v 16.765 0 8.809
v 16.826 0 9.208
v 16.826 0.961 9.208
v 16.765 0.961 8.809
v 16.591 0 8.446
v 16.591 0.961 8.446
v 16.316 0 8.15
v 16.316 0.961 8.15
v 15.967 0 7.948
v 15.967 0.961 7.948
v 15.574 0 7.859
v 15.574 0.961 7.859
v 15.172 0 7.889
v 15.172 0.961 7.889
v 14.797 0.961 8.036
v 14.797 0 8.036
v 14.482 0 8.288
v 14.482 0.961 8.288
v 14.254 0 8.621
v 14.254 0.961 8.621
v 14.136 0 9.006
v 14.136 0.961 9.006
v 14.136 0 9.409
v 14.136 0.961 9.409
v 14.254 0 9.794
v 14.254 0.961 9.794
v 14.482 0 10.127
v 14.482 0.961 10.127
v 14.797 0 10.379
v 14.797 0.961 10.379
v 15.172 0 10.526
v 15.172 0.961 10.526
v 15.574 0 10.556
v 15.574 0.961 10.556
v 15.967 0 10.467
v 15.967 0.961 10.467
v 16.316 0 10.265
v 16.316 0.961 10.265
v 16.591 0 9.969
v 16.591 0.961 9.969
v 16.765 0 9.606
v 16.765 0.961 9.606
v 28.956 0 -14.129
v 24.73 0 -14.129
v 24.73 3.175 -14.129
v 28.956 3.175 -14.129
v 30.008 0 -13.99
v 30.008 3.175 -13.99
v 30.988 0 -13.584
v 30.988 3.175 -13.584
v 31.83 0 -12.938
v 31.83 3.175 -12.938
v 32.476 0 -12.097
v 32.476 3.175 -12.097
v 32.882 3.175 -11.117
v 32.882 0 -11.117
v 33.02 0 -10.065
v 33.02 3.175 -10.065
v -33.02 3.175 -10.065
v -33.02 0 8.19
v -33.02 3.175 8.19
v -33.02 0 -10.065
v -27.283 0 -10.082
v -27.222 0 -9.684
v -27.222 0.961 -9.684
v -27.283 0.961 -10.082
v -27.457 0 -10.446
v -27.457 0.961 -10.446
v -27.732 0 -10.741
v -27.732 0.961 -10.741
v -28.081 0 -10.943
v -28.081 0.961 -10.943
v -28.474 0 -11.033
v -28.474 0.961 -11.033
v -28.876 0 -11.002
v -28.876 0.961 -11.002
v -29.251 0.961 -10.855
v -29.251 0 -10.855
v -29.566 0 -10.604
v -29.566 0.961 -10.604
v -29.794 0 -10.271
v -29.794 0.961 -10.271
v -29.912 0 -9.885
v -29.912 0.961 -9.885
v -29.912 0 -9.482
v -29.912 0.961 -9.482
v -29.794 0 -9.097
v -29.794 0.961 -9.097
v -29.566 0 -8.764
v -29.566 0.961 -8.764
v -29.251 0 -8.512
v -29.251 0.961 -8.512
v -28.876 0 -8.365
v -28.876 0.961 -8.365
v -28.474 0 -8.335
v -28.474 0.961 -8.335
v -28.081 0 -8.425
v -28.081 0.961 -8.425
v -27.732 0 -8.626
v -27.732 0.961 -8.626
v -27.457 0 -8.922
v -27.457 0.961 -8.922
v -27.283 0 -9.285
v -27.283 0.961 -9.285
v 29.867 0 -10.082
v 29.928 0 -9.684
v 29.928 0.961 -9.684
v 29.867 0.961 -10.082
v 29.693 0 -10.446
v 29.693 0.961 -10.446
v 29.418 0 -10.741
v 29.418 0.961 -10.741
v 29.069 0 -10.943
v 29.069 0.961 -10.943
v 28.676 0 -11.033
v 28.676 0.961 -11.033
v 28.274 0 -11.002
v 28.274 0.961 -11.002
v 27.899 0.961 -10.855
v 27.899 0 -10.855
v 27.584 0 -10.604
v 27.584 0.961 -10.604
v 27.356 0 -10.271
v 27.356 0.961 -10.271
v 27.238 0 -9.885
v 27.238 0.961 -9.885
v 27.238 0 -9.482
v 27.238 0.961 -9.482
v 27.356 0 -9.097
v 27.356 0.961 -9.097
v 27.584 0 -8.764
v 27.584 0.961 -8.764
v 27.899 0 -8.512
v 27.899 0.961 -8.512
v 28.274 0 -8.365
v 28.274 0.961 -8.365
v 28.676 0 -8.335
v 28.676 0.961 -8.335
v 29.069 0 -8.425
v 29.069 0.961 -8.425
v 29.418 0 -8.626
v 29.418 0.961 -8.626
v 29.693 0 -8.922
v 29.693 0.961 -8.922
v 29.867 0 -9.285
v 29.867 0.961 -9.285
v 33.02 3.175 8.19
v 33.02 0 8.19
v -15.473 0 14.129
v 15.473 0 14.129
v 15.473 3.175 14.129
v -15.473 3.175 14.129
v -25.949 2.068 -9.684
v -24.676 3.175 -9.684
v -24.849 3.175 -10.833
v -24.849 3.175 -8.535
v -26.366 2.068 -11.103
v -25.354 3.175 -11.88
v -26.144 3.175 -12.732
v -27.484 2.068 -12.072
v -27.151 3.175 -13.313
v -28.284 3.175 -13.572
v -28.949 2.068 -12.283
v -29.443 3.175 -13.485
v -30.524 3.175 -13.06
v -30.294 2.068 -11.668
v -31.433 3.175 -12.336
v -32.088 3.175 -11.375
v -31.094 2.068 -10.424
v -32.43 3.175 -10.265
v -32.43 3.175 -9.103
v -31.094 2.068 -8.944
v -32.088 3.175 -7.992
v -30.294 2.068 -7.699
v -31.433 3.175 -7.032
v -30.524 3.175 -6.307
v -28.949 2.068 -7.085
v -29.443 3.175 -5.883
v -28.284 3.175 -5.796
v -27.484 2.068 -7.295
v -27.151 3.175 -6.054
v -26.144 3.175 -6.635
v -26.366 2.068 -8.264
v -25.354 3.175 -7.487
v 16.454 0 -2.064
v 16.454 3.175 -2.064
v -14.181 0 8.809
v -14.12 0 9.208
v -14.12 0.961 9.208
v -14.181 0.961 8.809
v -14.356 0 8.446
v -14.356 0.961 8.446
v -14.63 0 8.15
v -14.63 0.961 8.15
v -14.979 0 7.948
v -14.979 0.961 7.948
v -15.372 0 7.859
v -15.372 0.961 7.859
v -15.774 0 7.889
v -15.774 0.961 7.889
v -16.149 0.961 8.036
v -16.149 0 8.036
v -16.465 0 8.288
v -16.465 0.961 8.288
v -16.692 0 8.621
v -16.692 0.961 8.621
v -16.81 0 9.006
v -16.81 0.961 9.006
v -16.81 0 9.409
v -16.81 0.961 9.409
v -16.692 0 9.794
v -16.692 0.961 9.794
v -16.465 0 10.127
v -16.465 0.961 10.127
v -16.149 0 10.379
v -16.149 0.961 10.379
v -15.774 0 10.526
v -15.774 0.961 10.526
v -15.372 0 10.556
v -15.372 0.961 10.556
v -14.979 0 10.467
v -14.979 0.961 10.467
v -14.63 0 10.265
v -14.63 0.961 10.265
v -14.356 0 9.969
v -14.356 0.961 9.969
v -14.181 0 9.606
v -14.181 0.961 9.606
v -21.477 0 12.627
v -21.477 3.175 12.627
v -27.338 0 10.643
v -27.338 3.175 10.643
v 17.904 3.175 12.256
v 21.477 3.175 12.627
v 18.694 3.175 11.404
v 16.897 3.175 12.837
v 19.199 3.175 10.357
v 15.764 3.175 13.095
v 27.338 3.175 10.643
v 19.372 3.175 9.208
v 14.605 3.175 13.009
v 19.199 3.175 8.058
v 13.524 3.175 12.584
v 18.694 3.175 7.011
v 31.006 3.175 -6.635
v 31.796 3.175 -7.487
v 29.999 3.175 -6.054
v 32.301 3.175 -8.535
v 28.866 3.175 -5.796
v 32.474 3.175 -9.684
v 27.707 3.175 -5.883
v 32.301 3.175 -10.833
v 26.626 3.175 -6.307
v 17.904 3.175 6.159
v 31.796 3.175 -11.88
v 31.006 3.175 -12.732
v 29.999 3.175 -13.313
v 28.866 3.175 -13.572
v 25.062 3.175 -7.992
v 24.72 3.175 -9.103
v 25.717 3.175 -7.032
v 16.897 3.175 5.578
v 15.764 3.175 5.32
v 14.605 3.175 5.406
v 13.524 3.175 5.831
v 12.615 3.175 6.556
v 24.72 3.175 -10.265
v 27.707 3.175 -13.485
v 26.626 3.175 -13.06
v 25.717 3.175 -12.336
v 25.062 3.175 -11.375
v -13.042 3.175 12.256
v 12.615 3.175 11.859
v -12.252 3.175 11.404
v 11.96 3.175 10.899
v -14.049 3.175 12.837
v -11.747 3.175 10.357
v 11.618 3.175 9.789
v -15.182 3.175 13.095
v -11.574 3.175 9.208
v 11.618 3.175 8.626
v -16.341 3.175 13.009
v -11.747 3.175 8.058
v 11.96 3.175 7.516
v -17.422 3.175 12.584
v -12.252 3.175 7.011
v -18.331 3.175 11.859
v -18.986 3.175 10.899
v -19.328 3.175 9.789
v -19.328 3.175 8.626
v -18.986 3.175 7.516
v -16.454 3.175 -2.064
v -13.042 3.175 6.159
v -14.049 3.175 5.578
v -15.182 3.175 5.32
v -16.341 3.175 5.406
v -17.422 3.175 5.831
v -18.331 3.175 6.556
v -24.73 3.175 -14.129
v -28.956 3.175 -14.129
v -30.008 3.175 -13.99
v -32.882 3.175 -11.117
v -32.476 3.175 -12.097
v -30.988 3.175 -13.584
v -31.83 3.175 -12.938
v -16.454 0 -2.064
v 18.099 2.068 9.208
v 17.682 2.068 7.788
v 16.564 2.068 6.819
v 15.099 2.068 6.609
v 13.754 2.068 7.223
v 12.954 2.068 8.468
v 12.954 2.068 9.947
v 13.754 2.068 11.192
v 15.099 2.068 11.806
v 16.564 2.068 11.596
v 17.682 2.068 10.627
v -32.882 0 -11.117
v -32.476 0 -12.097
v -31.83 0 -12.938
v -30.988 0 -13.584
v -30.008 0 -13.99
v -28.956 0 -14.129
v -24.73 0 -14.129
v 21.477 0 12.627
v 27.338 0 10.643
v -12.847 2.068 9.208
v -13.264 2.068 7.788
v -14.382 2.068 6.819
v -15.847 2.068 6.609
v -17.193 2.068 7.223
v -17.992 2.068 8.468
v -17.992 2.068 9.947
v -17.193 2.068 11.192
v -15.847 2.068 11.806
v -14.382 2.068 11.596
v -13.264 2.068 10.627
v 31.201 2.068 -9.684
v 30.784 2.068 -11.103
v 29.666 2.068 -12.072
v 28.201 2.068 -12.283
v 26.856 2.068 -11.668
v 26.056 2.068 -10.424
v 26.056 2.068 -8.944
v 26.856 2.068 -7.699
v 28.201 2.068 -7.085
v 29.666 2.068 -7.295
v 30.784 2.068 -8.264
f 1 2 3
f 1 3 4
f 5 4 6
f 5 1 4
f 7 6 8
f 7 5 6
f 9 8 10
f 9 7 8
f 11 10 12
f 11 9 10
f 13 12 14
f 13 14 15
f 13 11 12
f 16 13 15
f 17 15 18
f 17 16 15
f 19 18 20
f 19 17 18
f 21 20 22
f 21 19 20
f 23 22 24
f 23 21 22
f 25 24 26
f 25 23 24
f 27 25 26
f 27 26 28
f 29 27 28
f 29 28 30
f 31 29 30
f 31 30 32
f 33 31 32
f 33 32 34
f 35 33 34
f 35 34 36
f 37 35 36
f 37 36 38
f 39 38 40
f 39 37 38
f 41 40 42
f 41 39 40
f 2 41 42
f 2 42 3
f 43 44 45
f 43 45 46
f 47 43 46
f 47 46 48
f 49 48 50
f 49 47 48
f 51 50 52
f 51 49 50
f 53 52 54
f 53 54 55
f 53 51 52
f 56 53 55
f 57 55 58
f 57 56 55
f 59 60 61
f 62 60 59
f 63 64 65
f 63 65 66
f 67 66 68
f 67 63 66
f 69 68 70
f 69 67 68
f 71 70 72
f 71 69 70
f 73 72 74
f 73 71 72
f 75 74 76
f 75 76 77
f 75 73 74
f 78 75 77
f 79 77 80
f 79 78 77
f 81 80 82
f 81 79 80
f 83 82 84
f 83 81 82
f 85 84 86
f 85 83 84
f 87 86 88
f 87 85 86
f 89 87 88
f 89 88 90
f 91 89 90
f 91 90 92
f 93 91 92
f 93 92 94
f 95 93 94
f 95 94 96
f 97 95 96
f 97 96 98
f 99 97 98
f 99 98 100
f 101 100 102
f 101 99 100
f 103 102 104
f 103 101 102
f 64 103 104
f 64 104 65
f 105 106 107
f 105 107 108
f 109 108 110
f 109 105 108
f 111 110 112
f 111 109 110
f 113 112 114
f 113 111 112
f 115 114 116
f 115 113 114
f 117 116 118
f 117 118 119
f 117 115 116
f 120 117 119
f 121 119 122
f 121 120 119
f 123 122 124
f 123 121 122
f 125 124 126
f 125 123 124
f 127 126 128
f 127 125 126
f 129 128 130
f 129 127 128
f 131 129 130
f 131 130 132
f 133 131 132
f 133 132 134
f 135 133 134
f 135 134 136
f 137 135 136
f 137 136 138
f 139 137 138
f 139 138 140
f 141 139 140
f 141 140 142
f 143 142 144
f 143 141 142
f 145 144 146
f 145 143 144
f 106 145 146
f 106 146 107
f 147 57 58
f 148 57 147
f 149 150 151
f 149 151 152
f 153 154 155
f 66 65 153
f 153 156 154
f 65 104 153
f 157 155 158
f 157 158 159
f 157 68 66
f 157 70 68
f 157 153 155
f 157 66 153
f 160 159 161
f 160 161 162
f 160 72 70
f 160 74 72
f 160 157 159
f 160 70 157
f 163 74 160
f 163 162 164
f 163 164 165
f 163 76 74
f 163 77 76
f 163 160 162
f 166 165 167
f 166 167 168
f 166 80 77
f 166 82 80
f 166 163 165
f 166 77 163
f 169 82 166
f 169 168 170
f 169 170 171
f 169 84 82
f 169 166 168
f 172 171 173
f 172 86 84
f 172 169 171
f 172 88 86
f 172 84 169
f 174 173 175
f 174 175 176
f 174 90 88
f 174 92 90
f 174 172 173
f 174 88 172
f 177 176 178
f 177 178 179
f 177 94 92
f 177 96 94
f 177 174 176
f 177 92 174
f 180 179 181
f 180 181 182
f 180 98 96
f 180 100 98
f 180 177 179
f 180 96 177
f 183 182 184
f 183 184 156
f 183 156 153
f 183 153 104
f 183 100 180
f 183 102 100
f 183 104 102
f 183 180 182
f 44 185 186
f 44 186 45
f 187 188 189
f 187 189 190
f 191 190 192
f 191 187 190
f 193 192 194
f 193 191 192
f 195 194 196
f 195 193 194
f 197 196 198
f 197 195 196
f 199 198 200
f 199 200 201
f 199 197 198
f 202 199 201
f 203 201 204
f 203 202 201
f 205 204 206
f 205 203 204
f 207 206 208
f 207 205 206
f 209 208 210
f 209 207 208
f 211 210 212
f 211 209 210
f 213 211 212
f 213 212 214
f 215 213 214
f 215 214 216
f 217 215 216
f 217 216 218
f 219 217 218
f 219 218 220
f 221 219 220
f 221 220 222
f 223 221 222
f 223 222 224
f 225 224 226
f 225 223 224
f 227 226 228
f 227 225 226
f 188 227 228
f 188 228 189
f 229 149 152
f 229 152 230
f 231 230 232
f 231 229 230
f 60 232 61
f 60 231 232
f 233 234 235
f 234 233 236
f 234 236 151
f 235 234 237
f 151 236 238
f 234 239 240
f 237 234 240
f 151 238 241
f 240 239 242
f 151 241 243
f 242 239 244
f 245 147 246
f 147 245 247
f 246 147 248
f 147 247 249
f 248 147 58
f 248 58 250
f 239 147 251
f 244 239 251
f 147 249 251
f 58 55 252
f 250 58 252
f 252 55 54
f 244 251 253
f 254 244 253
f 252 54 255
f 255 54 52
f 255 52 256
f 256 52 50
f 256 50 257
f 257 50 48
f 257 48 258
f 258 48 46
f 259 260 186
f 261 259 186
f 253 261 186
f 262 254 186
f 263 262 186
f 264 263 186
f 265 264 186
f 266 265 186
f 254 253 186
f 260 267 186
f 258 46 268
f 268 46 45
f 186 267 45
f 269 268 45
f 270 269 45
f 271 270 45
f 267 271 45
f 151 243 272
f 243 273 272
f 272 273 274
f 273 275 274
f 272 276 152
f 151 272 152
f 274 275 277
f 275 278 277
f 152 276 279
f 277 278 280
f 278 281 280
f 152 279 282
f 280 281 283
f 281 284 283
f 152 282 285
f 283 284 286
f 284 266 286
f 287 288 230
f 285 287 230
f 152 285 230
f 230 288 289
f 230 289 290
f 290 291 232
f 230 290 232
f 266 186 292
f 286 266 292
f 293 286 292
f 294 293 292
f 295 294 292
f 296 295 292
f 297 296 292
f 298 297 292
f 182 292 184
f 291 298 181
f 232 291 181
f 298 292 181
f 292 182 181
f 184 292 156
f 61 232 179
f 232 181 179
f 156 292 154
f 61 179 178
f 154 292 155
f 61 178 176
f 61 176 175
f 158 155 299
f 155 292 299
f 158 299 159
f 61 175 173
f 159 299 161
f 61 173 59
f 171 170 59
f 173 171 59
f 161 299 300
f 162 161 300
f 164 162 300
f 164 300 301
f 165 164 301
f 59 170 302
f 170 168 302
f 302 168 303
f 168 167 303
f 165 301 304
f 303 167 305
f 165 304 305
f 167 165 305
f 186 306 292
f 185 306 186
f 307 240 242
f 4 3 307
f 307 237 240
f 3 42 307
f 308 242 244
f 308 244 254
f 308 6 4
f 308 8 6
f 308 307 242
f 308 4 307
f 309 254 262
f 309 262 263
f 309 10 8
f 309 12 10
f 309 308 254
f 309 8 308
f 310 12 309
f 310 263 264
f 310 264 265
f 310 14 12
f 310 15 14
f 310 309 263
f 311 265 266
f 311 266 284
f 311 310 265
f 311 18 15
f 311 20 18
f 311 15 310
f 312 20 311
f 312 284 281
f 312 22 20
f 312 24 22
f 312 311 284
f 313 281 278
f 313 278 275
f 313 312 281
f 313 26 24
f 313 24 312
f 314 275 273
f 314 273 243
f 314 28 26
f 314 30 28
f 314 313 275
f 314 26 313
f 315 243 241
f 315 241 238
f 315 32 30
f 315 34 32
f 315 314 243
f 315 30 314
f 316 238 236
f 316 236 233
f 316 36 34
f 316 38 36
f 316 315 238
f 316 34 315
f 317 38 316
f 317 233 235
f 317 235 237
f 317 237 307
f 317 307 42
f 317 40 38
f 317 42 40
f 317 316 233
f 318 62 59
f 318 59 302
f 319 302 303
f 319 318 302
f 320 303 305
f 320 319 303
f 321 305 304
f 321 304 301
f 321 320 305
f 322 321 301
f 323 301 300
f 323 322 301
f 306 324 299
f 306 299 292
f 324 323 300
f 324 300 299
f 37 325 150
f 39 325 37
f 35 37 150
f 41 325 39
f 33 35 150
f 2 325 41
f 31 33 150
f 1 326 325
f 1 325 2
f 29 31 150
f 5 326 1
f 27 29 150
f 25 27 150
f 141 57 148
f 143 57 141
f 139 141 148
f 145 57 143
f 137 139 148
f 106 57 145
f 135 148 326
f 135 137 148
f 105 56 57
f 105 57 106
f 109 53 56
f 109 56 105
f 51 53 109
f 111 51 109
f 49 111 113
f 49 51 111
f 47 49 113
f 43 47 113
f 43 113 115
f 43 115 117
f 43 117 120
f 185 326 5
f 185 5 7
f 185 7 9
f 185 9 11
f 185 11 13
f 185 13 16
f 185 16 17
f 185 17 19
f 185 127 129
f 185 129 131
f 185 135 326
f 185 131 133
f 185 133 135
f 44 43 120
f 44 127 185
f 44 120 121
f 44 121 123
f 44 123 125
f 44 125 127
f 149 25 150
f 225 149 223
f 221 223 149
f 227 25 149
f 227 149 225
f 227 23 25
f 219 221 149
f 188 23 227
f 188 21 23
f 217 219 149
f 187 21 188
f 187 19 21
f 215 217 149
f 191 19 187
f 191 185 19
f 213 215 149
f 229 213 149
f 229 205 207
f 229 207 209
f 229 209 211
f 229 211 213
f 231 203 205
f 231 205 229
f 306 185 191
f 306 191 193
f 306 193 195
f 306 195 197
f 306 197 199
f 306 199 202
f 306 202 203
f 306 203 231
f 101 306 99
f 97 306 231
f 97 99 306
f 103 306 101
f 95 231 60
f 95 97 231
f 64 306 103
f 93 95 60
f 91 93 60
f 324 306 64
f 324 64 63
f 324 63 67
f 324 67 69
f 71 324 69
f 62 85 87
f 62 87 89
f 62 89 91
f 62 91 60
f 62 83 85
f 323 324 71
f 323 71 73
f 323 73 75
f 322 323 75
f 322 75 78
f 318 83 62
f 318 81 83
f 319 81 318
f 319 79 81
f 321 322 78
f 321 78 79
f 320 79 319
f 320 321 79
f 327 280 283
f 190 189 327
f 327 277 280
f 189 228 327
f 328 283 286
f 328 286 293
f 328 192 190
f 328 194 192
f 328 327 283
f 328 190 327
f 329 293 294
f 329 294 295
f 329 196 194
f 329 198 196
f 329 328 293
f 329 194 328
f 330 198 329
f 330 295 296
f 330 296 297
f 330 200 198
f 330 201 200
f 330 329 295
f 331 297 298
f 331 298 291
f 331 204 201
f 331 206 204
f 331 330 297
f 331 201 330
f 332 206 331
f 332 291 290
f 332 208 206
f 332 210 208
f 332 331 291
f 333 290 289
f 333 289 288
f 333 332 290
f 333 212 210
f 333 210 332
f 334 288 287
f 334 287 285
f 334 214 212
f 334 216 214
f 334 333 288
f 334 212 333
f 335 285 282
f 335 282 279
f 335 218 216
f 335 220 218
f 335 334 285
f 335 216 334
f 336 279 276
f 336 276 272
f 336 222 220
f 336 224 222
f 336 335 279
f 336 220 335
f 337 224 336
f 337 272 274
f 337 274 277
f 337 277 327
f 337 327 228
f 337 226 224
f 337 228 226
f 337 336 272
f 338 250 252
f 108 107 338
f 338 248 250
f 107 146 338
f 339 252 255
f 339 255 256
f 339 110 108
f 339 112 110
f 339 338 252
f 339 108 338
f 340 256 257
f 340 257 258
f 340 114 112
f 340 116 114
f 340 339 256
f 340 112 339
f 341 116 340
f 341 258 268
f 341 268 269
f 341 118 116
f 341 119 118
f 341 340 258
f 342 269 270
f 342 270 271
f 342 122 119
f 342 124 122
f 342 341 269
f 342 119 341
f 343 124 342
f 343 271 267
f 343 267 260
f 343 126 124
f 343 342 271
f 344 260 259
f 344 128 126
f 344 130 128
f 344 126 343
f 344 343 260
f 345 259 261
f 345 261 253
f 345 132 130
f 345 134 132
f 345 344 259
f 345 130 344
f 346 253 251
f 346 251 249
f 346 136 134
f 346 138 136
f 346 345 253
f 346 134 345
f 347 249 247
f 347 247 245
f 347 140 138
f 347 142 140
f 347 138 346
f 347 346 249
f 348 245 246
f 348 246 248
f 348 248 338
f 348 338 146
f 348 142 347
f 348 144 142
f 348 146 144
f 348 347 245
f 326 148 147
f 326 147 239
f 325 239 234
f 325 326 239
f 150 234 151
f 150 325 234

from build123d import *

# Parameters (mm, degrees)
SKETCH1_R           = 1.35255
BOSS_EXTRUDE1_DEPTH = 3.175
CHAMFER2_SIZE       = 2.54635
CHAMFER2_SIZE2      = 2.213508285


with BuildPart() as part:
    # Sketch1 → Boss-Extrude1 (new body)
    with BuildSketch(Plane(origin=(0, 0, 0), x_dir=(1, 0, 0), z_dir=(0, 1, 0))):
        with BuildLine():
            Line((-24.73005605, 14.12875), (-16.454266742, 2.06375))
            Line((-16.454266742, 2.06375), (16.454266742, 2.06375))
            Line((16.454266742, 2.06375), (24.73005605, 14.12875))
            Line((24.73005605, 14.12875), (28.956, 14.12875))
            ThreePointArc((28.956, 14.12875), (31.829681959, 12.938431959), (33.02, 10.06475))
            Line((33.02, 10.06475), (33.02, -8.19025964))
            ThreePointArc((33.02, -8.19025964), (24.427649347, -11.694709026), (15.473036022, -14.12875))
            Line((15.473036022, -14.12875), (-15.473036022, -14.12875))
            ThreePointArc((-15.473036022, -14.12875), (-24.427649347, -11.694709026), (-33.02, -8.19025964))
            Line((-33.02, -8.19025964), (-33.02, 10.06475))
            ThreePointArc((-33.02, 10.06475), (-31.829681959, 12.938431959), (-28.956, 14.12875))
            Line((-28.956, 14.12875), (-24.73005605, 14.12875))
        make_face()
        with Locations((-28.575, 9.68375)):
            Circle(SKETCH1_R, mode=Mode.SUBTRACT)
        with Locations((-15.473036022, -9.2075)):
            Circle(SKETCH1_R, mode=Mode.SUBTRACT)
        with Locations((15.473036022, -9.2075)):
            Circle(SKETCH1_R, mode=Mode.SUBTRACT)
        with Locations((28.575, 9.68375)):
            Circle(SKETCH1_R, mode=Mode.SUBTRACT)
    extrude(amount=BOSS_EXTRUDE1_DEPTH)

    # Chamfer2
    chamfer2_edges = [part.edges().sort_by_distance(p)[0] for p in [
        (-16.825586022, 3.175, 9.2075),
        (-29.92755, 3.175, -9.68375),
        (14.120486022, 3.175, 9.2075),
        (27.22245, 3.175, -9.68375),
    ]]
    chamfer2_side = [part.faces().sort_by_distance(p)[0] for p in [
        (0, 3.175, 2.574836874),
    ]]
    chamfer(chamfer2_edges, length=CHAMFER2_SIZE, length2=CHAMFER2_SIZE2, reference=chamfer2_side[0])


solid = part.part
